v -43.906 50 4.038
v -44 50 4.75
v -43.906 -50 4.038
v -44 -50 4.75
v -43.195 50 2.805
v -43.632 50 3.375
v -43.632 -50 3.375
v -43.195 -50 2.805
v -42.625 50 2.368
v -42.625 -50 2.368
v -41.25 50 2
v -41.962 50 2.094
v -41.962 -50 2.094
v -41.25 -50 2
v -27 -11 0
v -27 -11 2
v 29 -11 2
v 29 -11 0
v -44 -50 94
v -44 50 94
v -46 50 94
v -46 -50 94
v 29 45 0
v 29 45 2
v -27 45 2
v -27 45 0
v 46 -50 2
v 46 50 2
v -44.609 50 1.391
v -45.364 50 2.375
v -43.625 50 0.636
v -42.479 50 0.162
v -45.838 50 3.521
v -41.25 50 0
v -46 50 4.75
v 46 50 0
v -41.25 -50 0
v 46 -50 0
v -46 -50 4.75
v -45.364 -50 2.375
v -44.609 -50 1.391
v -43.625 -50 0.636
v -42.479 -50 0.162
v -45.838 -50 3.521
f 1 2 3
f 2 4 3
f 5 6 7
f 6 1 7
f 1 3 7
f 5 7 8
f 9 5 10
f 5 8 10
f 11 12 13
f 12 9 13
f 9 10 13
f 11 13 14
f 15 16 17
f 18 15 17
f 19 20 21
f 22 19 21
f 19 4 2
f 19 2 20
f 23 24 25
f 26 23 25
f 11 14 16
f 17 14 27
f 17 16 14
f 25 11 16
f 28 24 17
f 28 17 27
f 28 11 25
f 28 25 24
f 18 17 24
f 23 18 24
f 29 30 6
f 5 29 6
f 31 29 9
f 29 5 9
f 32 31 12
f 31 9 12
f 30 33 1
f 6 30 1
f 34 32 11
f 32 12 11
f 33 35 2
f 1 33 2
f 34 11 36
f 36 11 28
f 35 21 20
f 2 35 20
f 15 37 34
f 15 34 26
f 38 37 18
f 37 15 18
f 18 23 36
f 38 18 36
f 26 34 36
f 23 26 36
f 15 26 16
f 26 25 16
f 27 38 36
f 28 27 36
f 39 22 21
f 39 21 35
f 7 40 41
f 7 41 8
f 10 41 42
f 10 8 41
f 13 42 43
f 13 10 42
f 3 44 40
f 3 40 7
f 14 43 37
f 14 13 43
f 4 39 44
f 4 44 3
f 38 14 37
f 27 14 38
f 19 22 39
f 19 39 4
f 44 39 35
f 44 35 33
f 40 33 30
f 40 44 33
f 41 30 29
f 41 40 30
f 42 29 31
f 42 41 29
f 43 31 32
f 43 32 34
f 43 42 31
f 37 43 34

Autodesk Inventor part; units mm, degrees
ref_plane "YZ Plane" through (0, 0, 0) normal (1, 0, 0) x (0, 1, 0)
ref_plane "XZ Plane" through (0, 0, 0) normal (0, 1, 0) x (-1, 0, 0)
ref_plane "XY Plane" through (0, 0, 0) normal (0, 0, 1) x (1, 0, 0)
sketch "Sketch1" plane through (0, 0, 0) normal (0, 0, 1) x (1, 0, 0)
  line L0 (-46, -50) -> (46, -50)
  line L1 (46, -50) -> (46, 50)
  line L2 (46, 50) -> (-46, 50)
  line L3 (-46, 50) -> (-46, -50)
  line L4 (-46, -50) -> (46, 50) construction
  line L5 (46, -50) -> (-46, 50) construction
  point P0 (0, 0)
  dimension "d154" = 92
  dimension "d155" = 100
extrude "Plate5" add sketch "Sketch1" along normal blind 2
sketch "Sketch7" plane through (-44, -50, 0) normal (-1, 0, 0) x (0, -1, 0)
  line L0 (-100, 0) -> (0, 0)
  line L1 (0, 0) -> (0, 94)
  line L2 (0, 94) -> (-100, 94)
  line L3 (-100, 94) -> (-100, 0)
edge flange "Flange3" height 94 angle 90 thickness 2 bend radius 2.75 thickness toward (-1, 0, 0) relief round relief width 2 relief depth 1 edges at (-46, 0, 2) wall of the first edge with corners at (-44, 50, 0) (-44, -50, 0) (-44, -50, 94) (-44, 50, 94)
bend "Bend3"
corner "Corner3"
sketch "Sketch8" plane through (0, 0, 2) normal (0, 0, 1) x (1, 0, 0)
  line L0 (46, 50) -> (46, -50) projected
  line L1 (-41.25, 50) -> (46, 50) projected
  line L2 (29, 45) -> (-27, 45)
  line L3 (-27, 45) -> (-27, -11)
  line L4 (-27, -11) -> (29, -11)
  line L5 (29, -11) -> (29, 45)
  line L6 (29, 45) -> (-27, -11) construction
  line L7 (-27, 45) -> (29, -11) construction
  point P0 (0, 0)
  point P1 (1, 17)
  point P2 (2.375, 50)
  dimension "d167" = 56
  dimension "d168" = 56
  dimension "d169" = 5
  dimension "d172" = 17
extrude "Cut1" cut sketch "Sketch8" against normal blind 2
properties part number "TZS 752 FDS 1200 FLANGE 2" material "Stainless Steel"
